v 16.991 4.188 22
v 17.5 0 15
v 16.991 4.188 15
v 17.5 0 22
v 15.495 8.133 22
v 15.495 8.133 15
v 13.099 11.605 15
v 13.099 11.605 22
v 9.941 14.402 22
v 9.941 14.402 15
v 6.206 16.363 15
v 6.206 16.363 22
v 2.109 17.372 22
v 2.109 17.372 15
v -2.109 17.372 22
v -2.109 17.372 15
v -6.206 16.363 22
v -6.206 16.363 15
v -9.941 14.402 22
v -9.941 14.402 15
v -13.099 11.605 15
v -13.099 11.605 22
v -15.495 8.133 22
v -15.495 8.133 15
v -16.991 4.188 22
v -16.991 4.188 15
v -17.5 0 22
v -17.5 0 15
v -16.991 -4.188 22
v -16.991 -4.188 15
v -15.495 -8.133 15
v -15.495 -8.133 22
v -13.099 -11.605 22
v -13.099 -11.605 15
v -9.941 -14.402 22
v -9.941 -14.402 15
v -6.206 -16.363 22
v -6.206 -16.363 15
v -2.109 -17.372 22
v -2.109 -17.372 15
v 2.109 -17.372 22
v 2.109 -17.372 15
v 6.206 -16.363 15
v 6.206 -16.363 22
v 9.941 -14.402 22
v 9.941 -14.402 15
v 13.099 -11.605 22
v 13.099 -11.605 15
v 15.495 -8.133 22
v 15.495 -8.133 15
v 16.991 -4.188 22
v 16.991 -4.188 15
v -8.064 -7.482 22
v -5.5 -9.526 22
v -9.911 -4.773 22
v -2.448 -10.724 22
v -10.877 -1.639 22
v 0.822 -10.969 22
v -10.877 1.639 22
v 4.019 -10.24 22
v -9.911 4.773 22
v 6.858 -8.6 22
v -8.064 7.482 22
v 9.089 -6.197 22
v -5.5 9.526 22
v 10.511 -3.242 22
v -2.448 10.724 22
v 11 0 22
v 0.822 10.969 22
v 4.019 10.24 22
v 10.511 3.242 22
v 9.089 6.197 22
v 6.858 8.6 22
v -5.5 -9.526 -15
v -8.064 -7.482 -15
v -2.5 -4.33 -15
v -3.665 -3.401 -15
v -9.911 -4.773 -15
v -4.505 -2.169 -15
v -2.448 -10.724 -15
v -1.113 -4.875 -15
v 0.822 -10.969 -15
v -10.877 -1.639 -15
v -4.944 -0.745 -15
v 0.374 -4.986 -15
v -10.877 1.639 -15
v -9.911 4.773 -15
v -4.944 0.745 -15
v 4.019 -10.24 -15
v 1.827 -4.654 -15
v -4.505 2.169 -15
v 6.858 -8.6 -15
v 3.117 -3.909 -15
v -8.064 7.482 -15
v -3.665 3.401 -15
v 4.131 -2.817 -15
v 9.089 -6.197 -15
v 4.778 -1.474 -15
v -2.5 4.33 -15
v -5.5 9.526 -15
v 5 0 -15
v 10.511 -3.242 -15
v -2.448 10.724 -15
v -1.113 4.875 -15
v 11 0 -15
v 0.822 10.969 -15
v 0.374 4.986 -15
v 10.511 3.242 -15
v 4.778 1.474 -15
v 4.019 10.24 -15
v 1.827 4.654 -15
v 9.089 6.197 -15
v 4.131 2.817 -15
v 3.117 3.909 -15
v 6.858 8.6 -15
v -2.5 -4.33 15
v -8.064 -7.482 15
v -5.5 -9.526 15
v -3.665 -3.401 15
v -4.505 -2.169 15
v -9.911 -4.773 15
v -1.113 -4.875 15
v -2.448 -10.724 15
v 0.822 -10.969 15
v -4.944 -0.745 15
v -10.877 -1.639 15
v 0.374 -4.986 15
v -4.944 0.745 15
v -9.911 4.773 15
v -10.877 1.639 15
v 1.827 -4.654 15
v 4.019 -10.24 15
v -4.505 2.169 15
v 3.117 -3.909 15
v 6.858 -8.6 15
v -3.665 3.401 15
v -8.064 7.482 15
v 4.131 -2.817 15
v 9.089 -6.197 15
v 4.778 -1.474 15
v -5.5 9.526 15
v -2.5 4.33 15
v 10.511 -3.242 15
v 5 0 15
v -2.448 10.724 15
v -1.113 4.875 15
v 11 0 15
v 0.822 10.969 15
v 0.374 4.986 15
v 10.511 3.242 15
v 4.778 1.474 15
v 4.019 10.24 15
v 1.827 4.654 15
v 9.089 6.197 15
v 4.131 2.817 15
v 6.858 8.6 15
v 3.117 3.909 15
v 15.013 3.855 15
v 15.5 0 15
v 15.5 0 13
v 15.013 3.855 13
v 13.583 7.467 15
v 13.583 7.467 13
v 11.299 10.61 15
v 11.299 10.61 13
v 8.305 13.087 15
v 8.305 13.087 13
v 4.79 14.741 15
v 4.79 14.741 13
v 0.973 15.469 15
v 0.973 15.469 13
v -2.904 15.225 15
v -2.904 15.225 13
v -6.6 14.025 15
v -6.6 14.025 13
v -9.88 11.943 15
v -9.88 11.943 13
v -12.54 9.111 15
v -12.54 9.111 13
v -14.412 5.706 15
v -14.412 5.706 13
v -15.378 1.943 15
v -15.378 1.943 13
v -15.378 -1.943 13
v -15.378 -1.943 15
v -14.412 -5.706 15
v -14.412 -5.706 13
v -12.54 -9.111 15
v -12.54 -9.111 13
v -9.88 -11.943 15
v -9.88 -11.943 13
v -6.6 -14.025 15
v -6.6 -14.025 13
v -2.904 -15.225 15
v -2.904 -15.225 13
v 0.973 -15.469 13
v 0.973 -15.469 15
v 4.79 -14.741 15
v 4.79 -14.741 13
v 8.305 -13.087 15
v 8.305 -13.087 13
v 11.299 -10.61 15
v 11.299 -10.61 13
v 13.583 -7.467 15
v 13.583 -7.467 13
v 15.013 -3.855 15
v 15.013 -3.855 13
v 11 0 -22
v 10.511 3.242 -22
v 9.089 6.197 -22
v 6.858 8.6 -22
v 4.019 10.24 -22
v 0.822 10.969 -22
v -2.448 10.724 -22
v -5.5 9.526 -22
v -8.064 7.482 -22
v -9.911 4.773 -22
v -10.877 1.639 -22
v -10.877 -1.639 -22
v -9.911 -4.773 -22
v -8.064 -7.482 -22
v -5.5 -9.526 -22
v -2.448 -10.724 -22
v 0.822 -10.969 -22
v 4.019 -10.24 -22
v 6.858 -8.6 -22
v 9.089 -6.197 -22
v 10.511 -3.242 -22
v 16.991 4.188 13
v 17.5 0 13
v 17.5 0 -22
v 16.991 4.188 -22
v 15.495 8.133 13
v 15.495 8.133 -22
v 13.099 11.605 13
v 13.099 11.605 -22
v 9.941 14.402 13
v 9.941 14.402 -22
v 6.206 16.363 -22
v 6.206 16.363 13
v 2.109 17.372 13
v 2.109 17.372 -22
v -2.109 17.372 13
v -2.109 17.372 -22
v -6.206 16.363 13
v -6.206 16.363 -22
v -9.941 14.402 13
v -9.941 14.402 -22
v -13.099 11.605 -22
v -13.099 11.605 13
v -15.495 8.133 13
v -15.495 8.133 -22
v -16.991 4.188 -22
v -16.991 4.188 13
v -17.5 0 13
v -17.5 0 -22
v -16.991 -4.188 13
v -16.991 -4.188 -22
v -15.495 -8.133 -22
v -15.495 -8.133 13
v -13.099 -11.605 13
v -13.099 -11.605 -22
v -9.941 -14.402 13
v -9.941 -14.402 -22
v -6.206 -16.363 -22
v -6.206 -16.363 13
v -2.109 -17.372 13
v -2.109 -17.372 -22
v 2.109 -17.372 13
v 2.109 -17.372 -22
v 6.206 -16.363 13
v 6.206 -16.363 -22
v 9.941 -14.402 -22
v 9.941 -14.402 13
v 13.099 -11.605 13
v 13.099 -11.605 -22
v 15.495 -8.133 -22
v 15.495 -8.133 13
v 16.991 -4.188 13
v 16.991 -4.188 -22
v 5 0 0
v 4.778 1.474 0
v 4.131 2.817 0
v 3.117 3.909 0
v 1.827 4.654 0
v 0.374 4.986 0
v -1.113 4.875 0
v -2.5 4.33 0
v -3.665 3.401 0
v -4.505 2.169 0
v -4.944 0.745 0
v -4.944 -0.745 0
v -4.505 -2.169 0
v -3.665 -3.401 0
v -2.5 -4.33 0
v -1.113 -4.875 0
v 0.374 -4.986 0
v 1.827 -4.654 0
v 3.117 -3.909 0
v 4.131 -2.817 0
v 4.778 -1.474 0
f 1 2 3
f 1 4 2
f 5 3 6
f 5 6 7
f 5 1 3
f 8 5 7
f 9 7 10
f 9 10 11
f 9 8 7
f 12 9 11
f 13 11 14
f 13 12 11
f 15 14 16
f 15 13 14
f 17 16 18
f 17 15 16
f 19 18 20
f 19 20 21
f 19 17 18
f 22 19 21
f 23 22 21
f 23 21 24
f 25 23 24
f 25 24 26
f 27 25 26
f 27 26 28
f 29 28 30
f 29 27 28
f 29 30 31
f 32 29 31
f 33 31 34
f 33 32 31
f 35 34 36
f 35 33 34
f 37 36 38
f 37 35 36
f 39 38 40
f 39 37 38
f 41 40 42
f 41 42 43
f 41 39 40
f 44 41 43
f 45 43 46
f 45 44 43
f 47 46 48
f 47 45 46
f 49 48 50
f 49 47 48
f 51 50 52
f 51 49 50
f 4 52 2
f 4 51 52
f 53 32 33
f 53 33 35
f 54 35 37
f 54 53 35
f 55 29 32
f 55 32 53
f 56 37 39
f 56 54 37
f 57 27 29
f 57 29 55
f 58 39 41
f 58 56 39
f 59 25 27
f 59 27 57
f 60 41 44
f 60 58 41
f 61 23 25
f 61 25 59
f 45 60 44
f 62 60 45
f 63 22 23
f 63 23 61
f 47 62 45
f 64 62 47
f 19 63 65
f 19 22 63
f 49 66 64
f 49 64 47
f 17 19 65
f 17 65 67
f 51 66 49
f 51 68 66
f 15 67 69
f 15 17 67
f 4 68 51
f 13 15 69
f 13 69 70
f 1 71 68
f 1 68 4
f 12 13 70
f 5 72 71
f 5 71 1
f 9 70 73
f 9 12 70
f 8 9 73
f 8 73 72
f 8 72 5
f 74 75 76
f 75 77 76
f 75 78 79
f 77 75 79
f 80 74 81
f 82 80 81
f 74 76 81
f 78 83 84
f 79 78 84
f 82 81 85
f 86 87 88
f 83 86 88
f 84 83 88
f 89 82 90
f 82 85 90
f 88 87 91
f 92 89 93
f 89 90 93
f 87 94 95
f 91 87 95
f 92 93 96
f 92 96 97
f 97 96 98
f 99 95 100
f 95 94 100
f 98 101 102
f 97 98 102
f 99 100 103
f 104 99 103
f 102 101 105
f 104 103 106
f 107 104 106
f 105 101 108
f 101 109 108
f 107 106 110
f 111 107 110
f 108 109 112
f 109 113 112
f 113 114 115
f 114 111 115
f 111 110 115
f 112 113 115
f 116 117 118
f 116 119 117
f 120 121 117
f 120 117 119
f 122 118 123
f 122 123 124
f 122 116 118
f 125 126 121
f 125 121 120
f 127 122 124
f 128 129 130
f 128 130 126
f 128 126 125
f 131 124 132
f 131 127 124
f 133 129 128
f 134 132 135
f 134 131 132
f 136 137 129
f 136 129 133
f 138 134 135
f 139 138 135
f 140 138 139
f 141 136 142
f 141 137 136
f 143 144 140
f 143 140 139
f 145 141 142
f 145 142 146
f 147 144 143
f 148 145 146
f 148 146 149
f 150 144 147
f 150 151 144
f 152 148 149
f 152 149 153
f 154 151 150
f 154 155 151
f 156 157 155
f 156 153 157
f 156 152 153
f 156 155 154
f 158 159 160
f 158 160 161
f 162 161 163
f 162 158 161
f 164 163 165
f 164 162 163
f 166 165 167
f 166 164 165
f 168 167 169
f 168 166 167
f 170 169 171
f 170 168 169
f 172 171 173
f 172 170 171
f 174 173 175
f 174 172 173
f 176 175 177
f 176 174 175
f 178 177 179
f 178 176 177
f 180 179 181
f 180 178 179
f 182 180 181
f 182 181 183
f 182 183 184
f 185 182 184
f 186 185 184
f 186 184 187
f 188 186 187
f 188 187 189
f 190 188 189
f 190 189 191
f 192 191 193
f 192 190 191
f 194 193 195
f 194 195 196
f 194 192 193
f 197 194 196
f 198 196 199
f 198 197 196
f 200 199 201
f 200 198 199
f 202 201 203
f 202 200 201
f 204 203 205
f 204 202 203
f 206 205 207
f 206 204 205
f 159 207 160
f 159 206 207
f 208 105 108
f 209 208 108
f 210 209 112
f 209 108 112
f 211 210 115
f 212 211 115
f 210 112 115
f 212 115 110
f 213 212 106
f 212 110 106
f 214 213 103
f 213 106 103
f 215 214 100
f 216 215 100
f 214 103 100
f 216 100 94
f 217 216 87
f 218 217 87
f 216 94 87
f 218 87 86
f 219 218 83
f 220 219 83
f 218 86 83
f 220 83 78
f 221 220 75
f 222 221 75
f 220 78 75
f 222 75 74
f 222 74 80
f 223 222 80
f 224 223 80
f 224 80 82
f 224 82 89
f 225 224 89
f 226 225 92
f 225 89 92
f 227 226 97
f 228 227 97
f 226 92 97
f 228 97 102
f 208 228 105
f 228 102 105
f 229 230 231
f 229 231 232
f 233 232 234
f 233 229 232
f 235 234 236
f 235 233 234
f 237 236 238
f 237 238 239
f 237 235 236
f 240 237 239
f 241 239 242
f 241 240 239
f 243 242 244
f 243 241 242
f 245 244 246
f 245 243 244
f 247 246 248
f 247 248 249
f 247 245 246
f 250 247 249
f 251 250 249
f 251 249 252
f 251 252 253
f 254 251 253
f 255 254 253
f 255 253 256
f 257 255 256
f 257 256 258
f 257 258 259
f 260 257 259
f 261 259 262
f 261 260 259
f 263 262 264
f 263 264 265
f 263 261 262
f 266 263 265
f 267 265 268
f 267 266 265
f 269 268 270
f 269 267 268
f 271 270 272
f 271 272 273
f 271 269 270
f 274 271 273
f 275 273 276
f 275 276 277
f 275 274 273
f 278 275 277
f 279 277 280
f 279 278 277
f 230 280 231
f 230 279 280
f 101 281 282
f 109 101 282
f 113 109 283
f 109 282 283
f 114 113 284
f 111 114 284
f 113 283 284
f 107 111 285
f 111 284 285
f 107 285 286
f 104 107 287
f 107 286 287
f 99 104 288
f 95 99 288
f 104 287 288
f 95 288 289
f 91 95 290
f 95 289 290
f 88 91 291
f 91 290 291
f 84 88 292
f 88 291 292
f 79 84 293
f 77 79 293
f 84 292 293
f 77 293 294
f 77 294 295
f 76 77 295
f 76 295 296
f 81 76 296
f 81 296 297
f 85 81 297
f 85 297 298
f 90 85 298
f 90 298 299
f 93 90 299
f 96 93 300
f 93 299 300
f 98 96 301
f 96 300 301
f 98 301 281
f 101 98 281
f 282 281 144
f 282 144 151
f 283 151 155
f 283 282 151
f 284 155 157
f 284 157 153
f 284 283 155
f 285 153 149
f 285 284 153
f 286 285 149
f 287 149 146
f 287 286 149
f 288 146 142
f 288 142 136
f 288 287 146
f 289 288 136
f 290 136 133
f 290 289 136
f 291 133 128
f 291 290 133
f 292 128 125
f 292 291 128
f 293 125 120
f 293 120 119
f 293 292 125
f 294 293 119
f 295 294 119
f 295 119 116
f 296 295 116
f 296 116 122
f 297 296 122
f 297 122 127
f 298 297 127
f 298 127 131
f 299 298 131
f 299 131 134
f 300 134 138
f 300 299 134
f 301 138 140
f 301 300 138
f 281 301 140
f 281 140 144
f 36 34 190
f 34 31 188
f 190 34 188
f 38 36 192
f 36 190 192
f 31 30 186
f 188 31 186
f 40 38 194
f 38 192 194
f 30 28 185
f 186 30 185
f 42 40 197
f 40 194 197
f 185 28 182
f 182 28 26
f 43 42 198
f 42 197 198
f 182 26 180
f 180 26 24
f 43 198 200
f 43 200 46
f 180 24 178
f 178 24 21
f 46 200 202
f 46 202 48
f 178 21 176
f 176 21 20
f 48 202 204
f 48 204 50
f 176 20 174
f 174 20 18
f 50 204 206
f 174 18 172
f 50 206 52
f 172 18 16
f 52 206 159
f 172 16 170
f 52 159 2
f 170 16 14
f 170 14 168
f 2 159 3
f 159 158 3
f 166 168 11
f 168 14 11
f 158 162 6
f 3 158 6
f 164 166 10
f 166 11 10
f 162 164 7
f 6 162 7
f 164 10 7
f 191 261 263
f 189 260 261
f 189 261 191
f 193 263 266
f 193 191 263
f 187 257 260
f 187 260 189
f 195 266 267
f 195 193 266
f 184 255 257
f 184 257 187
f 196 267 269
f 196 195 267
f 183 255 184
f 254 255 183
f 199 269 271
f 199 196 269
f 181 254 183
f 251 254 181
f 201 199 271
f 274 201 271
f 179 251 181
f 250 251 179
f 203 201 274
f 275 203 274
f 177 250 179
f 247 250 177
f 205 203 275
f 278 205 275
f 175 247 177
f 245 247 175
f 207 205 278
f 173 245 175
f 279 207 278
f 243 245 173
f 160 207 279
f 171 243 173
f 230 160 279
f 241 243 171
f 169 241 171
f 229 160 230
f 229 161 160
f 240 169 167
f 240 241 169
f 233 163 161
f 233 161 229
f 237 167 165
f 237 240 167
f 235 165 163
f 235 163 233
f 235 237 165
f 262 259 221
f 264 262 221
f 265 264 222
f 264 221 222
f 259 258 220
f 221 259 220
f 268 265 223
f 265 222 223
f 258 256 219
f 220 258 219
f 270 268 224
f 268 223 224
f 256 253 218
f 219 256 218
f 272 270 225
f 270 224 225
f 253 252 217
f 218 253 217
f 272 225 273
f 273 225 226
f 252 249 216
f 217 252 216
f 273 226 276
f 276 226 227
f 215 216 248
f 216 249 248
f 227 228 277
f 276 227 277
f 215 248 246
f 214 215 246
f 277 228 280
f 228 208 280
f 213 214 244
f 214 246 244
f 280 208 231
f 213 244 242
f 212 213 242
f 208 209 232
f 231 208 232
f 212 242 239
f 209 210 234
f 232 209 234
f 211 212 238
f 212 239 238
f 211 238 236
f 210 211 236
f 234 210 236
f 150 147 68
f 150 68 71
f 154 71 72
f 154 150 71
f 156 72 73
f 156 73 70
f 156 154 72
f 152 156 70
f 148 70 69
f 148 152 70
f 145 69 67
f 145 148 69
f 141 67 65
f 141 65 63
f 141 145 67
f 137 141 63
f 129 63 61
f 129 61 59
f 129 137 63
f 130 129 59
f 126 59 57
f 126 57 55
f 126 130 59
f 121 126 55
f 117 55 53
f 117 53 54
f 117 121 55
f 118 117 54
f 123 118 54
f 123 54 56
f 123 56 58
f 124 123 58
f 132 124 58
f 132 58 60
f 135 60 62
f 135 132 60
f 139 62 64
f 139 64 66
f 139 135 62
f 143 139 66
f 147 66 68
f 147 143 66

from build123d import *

# Parameters (mm, degrees)
F0_R     = 17.5
F0_R_2   = 5
F1_DEPTH = 15
F2_R     = 17.5
F2_R_2   = 11
F3_DEPTH = 7
F6_R     = 17.5
F6_R_2   = 15.5
F7_DEPTH = 2


with BuildPart() as f1:
    # F0 (on Top) → F1 (new body)
    with BuildSketch(Plane.XY):
        Circle(F0_R)
        Circle(F0_R_2, mode=Mode.SUBTRACT)
    extrude(amount=F1_DEPTH)

    # F2 (on face) → F3 (join)
    with BuildSketch(Plane.XY.offset(15)):
        Circle(F2_R)
        Circle(F2_R_2, mode=Mode.SUBTRACT)
    extrude(amount=F3_DEPTH)

    # F4: F1 across plane


with BuildPart() as f1_1:
    add(f1.part)
    add(f1.part.mirror(Plane.XY))

    # F6 (on offset) → F7 (cut)
    with BuildSketch(Plane.XY.offset(15)):
        Circle(F6_R)
        Circle(F6_R_2, mode=Mode.SUBTRACT)
    extrude(amount=-F7_DEPTH, mode=Mode.SUBTRACT)


solid = f1_1.part
